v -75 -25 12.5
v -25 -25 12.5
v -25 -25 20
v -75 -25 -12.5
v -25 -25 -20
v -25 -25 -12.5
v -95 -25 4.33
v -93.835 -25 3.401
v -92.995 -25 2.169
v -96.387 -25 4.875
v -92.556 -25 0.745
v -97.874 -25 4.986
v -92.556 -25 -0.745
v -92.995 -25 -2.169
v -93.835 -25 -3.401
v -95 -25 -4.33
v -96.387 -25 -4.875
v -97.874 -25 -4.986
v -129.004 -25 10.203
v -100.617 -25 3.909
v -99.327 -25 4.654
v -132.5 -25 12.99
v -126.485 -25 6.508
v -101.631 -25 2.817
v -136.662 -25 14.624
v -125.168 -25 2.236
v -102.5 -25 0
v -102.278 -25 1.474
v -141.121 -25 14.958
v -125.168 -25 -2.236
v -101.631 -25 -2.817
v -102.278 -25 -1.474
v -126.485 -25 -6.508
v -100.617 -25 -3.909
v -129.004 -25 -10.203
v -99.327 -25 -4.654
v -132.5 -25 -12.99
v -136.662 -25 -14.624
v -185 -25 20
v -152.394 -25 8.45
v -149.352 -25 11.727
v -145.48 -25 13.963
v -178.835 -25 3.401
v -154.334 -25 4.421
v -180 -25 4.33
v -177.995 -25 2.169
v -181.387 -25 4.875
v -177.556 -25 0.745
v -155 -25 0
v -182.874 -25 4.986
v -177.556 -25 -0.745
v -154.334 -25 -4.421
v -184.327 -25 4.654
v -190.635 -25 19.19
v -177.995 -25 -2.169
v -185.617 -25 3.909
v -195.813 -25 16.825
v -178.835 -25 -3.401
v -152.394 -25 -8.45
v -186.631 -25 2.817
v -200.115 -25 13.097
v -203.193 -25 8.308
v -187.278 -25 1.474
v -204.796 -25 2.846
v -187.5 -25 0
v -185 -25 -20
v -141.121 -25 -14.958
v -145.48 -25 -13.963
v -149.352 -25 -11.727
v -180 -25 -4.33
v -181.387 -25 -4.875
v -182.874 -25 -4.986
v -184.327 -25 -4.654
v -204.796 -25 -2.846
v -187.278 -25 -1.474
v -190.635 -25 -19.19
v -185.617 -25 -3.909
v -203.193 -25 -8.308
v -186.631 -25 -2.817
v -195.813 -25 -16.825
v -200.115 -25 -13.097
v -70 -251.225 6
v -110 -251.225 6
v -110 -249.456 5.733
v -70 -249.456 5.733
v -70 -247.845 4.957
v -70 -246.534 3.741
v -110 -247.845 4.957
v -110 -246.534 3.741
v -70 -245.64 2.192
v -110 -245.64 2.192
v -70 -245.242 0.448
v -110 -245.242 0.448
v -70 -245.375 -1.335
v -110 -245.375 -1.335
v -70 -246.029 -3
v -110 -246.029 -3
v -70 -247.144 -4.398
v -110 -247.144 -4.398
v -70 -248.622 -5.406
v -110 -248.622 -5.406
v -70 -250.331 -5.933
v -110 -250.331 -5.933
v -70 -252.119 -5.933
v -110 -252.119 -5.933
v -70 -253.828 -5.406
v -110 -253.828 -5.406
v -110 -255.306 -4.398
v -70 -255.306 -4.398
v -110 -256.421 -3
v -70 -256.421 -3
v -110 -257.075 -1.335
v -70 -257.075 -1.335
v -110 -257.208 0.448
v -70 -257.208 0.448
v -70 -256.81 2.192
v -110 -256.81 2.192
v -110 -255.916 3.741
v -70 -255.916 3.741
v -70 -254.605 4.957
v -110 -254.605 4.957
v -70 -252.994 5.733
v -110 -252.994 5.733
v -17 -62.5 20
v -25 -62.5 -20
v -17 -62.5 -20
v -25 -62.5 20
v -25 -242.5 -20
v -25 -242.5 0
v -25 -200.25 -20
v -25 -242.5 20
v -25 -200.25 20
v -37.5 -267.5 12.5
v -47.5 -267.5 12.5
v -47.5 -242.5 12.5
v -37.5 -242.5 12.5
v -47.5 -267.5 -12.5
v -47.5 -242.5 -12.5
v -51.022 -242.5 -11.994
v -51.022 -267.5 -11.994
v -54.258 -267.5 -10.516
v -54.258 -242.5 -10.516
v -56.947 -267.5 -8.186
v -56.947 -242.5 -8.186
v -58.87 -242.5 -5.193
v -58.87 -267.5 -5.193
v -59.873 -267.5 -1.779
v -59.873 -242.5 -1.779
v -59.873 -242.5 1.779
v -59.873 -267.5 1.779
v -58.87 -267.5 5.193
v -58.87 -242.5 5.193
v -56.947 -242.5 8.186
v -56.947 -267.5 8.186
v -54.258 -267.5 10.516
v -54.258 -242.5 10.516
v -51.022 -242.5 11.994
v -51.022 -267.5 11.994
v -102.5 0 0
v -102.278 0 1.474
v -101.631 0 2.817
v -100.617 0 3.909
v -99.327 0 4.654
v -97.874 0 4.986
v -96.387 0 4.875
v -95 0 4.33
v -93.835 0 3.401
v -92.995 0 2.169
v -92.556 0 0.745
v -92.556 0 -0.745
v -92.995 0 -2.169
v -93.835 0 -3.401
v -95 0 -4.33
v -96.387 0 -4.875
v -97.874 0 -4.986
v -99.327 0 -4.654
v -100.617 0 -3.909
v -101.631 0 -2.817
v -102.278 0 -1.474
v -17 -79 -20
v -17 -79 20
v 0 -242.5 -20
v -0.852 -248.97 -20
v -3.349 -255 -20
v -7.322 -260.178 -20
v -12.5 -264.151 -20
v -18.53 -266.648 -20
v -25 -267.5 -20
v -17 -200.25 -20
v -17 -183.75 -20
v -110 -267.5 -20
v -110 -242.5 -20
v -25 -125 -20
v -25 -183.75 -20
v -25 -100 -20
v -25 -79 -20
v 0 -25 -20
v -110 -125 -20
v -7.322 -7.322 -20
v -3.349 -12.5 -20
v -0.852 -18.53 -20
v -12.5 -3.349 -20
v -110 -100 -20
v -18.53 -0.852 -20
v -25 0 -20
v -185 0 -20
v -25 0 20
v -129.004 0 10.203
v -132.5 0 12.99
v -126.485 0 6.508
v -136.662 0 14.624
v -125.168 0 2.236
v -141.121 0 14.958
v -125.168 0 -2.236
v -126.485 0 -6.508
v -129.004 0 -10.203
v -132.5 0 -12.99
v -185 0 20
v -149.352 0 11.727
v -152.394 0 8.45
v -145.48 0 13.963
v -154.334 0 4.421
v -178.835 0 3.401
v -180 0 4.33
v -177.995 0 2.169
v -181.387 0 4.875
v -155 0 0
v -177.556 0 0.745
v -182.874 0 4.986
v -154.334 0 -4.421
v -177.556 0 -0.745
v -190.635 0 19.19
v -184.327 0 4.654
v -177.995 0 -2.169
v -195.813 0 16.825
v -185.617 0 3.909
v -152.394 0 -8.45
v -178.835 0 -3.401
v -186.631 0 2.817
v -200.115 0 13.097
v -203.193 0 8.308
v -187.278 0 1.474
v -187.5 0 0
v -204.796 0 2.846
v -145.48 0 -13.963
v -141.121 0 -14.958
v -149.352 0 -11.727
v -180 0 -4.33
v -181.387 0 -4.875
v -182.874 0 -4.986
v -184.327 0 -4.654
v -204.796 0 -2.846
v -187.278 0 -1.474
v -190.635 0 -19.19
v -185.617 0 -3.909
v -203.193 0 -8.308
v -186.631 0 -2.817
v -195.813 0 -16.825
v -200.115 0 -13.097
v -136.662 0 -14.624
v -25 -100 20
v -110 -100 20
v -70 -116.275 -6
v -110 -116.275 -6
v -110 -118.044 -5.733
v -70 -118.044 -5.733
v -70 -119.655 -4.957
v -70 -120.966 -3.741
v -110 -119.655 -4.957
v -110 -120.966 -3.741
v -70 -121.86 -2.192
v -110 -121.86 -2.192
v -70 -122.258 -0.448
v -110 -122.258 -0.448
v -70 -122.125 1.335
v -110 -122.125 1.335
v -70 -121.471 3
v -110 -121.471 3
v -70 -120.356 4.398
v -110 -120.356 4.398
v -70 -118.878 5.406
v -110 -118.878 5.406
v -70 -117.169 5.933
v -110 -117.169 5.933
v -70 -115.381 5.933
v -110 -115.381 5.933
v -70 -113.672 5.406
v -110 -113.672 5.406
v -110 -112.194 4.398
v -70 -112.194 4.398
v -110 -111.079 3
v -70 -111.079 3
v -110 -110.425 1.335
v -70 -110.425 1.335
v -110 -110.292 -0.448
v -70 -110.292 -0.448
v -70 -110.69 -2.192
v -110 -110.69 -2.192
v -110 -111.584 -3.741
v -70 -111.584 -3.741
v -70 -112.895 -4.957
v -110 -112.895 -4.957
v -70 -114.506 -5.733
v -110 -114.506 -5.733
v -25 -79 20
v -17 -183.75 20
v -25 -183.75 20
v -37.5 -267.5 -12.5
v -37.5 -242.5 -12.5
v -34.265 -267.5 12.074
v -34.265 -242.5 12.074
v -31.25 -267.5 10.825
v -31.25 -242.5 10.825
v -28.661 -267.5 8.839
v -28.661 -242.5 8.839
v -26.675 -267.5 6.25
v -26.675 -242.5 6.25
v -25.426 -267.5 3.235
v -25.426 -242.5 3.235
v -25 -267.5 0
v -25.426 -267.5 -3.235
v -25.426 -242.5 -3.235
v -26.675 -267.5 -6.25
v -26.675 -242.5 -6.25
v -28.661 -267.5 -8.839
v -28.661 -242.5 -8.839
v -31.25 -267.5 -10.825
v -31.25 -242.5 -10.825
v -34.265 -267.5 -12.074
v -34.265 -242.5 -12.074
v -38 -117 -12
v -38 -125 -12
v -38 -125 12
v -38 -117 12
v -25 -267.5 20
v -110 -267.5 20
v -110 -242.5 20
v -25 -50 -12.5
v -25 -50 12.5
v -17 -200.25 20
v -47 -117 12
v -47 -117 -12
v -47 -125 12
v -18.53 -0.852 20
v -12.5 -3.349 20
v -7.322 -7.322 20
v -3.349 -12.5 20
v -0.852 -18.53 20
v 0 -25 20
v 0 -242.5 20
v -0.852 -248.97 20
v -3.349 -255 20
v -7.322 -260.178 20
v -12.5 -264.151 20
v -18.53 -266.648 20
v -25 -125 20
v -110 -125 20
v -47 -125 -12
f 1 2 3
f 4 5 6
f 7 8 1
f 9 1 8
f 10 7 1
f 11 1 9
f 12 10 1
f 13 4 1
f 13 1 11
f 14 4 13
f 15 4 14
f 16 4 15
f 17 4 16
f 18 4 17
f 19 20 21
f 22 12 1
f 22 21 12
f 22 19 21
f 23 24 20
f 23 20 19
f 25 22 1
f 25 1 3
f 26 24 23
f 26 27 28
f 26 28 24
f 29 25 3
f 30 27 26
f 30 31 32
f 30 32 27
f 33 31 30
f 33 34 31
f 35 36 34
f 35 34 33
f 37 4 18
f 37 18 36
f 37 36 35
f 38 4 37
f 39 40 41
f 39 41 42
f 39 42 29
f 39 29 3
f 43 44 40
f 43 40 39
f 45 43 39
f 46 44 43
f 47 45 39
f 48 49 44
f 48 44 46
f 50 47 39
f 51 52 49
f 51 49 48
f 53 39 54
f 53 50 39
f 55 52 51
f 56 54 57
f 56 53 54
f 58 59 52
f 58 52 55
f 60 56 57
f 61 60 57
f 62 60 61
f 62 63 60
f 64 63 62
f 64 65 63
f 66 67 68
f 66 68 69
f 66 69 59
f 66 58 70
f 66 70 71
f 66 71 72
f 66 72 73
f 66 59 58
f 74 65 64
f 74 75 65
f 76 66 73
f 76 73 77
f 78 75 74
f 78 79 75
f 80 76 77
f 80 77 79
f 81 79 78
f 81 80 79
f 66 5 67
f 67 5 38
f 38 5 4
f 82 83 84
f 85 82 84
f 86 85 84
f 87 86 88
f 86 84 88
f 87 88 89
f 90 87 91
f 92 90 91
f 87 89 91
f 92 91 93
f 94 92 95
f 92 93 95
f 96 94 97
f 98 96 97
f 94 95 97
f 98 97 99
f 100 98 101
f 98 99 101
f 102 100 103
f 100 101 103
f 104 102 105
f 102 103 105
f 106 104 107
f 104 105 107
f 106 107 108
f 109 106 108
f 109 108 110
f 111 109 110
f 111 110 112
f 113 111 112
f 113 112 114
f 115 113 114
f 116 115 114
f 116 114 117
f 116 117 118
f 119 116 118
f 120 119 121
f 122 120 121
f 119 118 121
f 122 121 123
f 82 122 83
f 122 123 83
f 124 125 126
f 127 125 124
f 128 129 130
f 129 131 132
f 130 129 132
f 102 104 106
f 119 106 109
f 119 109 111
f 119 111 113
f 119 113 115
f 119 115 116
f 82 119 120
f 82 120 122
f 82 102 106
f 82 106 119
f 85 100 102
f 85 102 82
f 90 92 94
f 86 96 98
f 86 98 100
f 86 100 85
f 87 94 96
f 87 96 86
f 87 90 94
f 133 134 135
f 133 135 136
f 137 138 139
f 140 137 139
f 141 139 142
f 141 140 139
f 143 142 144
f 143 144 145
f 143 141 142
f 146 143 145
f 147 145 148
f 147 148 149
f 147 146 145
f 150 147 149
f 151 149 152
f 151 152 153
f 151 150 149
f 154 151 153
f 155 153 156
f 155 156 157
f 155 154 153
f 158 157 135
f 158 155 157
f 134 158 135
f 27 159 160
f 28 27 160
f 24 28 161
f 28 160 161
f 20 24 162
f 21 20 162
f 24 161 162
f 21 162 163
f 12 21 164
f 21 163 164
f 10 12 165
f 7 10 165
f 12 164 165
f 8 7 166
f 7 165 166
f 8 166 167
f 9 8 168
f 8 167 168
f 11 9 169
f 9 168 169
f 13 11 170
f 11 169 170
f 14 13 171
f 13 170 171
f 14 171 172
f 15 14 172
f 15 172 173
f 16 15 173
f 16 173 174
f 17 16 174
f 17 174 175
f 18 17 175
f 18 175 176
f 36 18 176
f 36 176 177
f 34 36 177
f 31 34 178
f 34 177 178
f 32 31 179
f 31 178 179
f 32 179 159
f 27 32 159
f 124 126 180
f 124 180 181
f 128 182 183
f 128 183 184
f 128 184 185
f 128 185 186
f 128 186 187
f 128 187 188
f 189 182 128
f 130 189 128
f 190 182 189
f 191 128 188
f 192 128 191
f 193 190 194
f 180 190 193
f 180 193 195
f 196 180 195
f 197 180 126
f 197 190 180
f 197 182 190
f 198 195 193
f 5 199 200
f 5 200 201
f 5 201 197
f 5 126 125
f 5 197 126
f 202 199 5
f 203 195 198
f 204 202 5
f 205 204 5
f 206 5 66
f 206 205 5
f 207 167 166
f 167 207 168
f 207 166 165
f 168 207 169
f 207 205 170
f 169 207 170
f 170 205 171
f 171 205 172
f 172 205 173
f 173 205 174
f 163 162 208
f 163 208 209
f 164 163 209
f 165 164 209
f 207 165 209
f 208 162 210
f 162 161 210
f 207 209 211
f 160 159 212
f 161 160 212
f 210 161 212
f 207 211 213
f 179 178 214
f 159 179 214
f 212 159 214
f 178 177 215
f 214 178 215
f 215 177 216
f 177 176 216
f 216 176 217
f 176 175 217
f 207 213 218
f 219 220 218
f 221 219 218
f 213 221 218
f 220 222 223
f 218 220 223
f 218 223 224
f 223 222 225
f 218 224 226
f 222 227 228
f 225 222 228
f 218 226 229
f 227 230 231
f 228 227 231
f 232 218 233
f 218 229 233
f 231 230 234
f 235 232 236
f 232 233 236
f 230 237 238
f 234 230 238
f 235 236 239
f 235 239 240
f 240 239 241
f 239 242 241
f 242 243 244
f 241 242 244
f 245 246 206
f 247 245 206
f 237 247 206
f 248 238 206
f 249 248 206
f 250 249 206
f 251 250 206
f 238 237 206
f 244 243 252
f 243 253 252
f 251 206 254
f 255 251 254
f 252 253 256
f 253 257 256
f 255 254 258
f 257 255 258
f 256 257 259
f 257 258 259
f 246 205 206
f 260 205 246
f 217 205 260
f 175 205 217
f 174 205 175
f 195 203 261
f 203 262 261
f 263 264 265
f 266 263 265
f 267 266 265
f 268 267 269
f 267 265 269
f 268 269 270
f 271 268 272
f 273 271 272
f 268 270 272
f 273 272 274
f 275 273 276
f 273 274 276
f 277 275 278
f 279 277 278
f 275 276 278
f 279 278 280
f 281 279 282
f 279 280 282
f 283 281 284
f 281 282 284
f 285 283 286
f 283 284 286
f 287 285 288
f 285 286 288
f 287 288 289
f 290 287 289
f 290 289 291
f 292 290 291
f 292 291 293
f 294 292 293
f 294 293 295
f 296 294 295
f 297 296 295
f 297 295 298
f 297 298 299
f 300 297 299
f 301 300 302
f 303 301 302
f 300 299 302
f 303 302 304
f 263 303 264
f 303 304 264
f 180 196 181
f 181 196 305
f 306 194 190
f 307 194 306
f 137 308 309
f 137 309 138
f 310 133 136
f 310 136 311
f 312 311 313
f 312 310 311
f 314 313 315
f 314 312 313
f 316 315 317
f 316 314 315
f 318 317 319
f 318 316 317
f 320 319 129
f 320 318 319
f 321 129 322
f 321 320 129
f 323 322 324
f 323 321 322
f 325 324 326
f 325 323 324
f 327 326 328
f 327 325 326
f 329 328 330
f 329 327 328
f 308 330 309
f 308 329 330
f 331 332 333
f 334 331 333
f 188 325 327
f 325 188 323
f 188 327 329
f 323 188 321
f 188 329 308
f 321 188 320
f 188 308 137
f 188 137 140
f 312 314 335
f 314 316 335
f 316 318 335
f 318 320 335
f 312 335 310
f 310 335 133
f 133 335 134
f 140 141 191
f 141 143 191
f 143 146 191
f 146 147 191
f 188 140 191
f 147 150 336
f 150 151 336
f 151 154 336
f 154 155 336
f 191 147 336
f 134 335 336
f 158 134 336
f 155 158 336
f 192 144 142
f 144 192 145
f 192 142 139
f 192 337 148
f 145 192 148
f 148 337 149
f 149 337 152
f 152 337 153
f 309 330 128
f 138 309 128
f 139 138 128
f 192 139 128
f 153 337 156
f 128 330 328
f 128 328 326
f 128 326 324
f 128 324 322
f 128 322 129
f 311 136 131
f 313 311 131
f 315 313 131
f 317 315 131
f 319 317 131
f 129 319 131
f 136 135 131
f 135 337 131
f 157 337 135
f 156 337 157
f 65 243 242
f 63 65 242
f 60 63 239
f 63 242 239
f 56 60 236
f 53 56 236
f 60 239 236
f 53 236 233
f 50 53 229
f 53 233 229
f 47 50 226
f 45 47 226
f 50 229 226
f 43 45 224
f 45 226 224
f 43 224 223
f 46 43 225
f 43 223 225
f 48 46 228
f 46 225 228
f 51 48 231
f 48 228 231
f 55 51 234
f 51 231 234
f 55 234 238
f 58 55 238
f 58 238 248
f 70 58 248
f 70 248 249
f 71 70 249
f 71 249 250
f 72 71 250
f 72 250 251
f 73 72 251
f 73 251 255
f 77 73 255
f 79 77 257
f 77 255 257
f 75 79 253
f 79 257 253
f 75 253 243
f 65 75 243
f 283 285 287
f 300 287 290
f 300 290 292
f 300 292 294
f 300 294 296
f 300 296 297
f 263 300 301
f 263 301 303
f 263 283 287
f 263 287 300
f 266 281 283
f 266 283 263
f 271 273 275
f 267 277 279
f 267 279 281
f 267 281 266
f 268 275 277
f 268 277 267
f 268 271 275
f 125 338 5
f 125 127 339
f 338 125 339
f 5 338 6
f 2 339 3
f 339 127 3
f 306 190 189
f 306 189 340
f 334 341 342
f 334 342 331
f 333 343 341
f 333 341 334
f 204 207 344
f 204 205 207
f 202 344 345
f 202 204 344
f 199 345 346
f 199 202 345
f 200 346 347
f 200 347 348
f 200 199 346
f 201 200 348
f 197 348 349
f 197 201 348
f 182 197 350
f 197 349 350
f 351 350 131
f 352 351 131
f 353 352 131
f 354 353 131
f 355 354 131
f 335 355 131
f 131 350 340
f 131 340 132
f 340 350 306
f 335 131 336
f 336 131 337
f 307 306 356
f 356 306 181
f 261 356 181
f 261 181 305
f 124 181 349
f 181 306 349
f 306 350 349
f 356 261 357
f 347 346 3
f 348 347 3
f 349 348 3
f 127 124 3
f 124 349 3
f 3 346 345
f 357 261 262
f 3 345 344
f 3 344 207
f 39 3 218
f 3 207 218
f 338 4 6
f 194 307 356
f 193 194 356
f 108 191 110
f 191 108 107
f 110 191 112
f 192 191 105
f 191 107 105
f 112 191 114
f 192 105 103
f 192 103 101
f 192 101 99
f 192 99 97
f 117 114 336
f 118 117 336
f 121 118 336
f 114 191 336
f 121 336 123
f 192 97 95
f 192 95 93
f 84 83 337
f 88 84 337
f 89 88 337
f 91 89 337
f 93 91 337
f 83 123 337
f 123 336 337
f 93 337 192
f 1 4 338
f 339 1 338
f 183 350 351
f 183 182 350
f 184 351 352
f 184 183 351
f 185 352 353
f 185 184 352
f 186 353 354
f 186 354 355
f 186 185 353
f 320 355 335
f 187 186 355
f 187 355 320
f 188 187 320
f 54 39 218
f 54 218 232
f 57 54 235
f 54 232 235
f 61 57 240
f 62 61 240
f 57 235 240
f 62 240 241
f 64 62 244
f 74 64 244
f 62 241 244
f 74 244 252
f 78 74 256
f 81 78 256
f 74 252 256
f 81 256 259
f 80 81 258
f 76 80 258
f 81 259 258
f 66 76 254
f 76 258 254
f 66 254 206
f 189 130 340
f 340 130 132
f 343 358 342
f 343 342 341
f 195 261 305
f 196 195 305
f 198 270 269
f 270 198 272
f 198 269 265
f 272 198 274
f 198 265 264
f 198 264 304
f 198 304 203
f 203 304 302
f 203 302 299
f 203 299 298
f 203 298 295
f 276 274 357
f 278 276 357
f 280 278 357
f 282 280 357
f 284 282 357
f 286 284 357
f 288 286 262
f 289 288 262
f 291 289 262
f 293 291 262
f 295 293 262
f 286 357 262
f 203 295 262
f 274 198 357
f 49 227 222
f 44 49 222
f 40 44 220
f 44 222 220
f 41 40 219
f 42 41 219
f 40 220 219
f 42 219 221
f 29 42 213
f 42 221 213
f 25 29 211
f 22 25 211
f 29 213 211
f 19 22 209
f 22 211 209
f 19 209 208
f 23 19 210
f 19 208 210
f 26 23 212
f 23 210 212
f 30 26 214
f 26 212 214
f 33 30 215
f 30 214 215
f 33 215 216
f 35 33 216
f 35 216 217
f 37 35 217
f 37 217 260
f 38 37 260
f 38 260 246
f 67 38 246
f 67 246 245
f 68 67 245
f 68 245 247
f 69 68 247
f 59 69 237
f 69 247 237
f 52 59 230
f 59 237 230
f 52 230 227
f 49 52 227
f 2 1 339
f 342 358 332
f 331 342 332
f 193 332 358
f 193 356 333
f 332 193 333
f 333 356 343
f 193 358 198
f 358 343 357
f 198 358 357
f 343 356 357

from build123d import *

# Parameters (mm, degrees)
BOSS_EXTRUDE1_DEPTH = 20
BOSS_EXTRUDE2_DEPTH = 25
SKETCH3_R           = 15
SKETCH3_R_2         = 5
CUT_EXTRUDE1_DEPTH  = 25
FILLET1_R           = 25
SKETCH4_R           = 6
CUT_EXTRUDE2_DEPTH  = 40
SKETCH5_W           = 40
SKETCH5_H           = 16.5
CUT_EXTRUDE3_DEPTH  = 8
RIB1_REACH          = 339.611
SKETCH6_WALL_W      = 733.123885092
SKETCH6_WALL_H      = 25
CUT_EXTRUDE4_DEPTH  = 25
SKETCH8_W           = 9
SKETCH8_H           = 24
CUT_EXTRUDE5_DEPTH  = 8


with BuildPart() as part:
    # Sketch1 → Boss-Extrude1 (new, symmetric)
    with BuildSketch(Plane.XY):
        Polygon((-185, 0), (0, 0), (0, -267.5), (-110, -267.5), (-110, -242.5), (-25, -242.5), (-25, -125), (-110, -125), (-110, -100), (-25, -100), (-25, -25), (-185, -25), align=None)
    extrude(amount=BOSS_EXTRUDE1_DEPTH, both=True)

    # Sketch2 → Boss-Extrude2 (add)
    with BuildSketch(Plane(origin=(0, 0, 0), x_dir=(1, 0, 0), z_dir=(0, 1, 0))):
        with BuildLine():
            Line((-185, 20), (-185, -20))
            ThreePointArc((-185, -20), (-205, 0), (-185, 20))
        make_face()
    extrude(amount=-BOSS_EXTRUDE2_DEPTH)

    # Sketch3 → Cut-Extrude1 (cut)
    with BuildSketch(Plane(origin=(0, 0, 0), x_dir=(1, 0, 0), z_dir=(0, 1, 0))):
        with Locations(Location((-140, 0, 0), (0, 0, 180))):
            Circle(SKETCH3_R)
        with Locations(Location((-182.5, 0, 0), (0, 0, 180))):
            Circle(SKETCH3_R_2)
        with Locations(Location((-97.5, 0, 0), (0, 0, 180))):
            Circle(SKETCH3_R_2)
    extrude(amount=-CUT_EXTRUDE1_DEPTH, mode=Mode.SUBTRACT)

    # Fillet1
    fillet1_edges = [part.edges().sort_by_distance(p)[0] for p in [
        (0, 0, 0),
        (0, -267.5, 0),
    ]]
    fillet(fillet1_edges, radius=FILLET1_R)

    # Sketch4 → Cut-Extrude2 (cut)
    with BuildSketch(Plane.ZY.offset(110)):
        with Locations((0, -251.225)):
            Circle(SKETCH4_R)
        with Locations(Location((0, -116.275, 0), (0, 0, 180))):
            Circle(SKETCH4_R)
    extrude(amount=-CUT_EXTRUDE2_DEPTH, mode=Mode.SUBTRACT)

    # Sketch5 → Cut-Extrude3 (cut)
    with BuildSketch(Plane.ZY.offset(25)):
        with Locations((0, -70.75)):
            Rectangle(SKETCH5_W, SKETCH5_H)
        with Locations((0, -192)):
            Rectangle(SKETCH5_W, SKETCH5_H)
    extrude(amount=-CUT_EXTRUDE3_DEPTH, mode=Mode.SUBTRACT)

    # Sketch6 wall → Rib1 (add, up to next)
    with BuildSketch(Plane(origin=(-50, -37.5, 0), x_dir=(0.894427191, -0.4472135955, 0), z_dir=(0.4472135955, 0.894427191, 0)), mode=Mode.PRIVATE) as rib1_sk1:
        Rectangle(SKETCH6_WALL_W, SKETCH6_WALL_H)
    rib1_tool1 = extrude(rib1_sk1.sketch, amount=RIB1_REACH, mode=Mode.PRIVATE) - part.part
    add(rib1_tool1.solids().sort_by_distance((-50, -37.5, 0))[0])

    # Sketch7 → Cut-Extrude4 (cut)
    with BuildSketch(Plane.XZ.offset(267.5)):
        with BuildLine():
            Line((-47.5, 12.5), (-37.5, 12.5))
            ThreePointArc((-37.5, 12.5), (-25, 0), (-37.5, -12.5))
            Line((-37.5, -12.5), (-47.5, -12.5))
            ThreePointArc((-47.5, -12.5), (-60, 0), (-47.5, 12.5))
        make_face()
    extrude(amount=-CUT_EXTRUDE4_DEPTH, mode=Mode.SUBTRACT)

    # Sketch8 → Cut-Extrude5 (cut)
    with BuildSketch(Plane.XZ.offset(125)):
        with Locations((-42.5, 0)):
            Rectangle(SKETCH8_W, SKETCH8_H)
    extrude(amount=-CUT_EXTRUDE5_DEPTH, mode=Mode.SUBTRACT)


solid = part.part
